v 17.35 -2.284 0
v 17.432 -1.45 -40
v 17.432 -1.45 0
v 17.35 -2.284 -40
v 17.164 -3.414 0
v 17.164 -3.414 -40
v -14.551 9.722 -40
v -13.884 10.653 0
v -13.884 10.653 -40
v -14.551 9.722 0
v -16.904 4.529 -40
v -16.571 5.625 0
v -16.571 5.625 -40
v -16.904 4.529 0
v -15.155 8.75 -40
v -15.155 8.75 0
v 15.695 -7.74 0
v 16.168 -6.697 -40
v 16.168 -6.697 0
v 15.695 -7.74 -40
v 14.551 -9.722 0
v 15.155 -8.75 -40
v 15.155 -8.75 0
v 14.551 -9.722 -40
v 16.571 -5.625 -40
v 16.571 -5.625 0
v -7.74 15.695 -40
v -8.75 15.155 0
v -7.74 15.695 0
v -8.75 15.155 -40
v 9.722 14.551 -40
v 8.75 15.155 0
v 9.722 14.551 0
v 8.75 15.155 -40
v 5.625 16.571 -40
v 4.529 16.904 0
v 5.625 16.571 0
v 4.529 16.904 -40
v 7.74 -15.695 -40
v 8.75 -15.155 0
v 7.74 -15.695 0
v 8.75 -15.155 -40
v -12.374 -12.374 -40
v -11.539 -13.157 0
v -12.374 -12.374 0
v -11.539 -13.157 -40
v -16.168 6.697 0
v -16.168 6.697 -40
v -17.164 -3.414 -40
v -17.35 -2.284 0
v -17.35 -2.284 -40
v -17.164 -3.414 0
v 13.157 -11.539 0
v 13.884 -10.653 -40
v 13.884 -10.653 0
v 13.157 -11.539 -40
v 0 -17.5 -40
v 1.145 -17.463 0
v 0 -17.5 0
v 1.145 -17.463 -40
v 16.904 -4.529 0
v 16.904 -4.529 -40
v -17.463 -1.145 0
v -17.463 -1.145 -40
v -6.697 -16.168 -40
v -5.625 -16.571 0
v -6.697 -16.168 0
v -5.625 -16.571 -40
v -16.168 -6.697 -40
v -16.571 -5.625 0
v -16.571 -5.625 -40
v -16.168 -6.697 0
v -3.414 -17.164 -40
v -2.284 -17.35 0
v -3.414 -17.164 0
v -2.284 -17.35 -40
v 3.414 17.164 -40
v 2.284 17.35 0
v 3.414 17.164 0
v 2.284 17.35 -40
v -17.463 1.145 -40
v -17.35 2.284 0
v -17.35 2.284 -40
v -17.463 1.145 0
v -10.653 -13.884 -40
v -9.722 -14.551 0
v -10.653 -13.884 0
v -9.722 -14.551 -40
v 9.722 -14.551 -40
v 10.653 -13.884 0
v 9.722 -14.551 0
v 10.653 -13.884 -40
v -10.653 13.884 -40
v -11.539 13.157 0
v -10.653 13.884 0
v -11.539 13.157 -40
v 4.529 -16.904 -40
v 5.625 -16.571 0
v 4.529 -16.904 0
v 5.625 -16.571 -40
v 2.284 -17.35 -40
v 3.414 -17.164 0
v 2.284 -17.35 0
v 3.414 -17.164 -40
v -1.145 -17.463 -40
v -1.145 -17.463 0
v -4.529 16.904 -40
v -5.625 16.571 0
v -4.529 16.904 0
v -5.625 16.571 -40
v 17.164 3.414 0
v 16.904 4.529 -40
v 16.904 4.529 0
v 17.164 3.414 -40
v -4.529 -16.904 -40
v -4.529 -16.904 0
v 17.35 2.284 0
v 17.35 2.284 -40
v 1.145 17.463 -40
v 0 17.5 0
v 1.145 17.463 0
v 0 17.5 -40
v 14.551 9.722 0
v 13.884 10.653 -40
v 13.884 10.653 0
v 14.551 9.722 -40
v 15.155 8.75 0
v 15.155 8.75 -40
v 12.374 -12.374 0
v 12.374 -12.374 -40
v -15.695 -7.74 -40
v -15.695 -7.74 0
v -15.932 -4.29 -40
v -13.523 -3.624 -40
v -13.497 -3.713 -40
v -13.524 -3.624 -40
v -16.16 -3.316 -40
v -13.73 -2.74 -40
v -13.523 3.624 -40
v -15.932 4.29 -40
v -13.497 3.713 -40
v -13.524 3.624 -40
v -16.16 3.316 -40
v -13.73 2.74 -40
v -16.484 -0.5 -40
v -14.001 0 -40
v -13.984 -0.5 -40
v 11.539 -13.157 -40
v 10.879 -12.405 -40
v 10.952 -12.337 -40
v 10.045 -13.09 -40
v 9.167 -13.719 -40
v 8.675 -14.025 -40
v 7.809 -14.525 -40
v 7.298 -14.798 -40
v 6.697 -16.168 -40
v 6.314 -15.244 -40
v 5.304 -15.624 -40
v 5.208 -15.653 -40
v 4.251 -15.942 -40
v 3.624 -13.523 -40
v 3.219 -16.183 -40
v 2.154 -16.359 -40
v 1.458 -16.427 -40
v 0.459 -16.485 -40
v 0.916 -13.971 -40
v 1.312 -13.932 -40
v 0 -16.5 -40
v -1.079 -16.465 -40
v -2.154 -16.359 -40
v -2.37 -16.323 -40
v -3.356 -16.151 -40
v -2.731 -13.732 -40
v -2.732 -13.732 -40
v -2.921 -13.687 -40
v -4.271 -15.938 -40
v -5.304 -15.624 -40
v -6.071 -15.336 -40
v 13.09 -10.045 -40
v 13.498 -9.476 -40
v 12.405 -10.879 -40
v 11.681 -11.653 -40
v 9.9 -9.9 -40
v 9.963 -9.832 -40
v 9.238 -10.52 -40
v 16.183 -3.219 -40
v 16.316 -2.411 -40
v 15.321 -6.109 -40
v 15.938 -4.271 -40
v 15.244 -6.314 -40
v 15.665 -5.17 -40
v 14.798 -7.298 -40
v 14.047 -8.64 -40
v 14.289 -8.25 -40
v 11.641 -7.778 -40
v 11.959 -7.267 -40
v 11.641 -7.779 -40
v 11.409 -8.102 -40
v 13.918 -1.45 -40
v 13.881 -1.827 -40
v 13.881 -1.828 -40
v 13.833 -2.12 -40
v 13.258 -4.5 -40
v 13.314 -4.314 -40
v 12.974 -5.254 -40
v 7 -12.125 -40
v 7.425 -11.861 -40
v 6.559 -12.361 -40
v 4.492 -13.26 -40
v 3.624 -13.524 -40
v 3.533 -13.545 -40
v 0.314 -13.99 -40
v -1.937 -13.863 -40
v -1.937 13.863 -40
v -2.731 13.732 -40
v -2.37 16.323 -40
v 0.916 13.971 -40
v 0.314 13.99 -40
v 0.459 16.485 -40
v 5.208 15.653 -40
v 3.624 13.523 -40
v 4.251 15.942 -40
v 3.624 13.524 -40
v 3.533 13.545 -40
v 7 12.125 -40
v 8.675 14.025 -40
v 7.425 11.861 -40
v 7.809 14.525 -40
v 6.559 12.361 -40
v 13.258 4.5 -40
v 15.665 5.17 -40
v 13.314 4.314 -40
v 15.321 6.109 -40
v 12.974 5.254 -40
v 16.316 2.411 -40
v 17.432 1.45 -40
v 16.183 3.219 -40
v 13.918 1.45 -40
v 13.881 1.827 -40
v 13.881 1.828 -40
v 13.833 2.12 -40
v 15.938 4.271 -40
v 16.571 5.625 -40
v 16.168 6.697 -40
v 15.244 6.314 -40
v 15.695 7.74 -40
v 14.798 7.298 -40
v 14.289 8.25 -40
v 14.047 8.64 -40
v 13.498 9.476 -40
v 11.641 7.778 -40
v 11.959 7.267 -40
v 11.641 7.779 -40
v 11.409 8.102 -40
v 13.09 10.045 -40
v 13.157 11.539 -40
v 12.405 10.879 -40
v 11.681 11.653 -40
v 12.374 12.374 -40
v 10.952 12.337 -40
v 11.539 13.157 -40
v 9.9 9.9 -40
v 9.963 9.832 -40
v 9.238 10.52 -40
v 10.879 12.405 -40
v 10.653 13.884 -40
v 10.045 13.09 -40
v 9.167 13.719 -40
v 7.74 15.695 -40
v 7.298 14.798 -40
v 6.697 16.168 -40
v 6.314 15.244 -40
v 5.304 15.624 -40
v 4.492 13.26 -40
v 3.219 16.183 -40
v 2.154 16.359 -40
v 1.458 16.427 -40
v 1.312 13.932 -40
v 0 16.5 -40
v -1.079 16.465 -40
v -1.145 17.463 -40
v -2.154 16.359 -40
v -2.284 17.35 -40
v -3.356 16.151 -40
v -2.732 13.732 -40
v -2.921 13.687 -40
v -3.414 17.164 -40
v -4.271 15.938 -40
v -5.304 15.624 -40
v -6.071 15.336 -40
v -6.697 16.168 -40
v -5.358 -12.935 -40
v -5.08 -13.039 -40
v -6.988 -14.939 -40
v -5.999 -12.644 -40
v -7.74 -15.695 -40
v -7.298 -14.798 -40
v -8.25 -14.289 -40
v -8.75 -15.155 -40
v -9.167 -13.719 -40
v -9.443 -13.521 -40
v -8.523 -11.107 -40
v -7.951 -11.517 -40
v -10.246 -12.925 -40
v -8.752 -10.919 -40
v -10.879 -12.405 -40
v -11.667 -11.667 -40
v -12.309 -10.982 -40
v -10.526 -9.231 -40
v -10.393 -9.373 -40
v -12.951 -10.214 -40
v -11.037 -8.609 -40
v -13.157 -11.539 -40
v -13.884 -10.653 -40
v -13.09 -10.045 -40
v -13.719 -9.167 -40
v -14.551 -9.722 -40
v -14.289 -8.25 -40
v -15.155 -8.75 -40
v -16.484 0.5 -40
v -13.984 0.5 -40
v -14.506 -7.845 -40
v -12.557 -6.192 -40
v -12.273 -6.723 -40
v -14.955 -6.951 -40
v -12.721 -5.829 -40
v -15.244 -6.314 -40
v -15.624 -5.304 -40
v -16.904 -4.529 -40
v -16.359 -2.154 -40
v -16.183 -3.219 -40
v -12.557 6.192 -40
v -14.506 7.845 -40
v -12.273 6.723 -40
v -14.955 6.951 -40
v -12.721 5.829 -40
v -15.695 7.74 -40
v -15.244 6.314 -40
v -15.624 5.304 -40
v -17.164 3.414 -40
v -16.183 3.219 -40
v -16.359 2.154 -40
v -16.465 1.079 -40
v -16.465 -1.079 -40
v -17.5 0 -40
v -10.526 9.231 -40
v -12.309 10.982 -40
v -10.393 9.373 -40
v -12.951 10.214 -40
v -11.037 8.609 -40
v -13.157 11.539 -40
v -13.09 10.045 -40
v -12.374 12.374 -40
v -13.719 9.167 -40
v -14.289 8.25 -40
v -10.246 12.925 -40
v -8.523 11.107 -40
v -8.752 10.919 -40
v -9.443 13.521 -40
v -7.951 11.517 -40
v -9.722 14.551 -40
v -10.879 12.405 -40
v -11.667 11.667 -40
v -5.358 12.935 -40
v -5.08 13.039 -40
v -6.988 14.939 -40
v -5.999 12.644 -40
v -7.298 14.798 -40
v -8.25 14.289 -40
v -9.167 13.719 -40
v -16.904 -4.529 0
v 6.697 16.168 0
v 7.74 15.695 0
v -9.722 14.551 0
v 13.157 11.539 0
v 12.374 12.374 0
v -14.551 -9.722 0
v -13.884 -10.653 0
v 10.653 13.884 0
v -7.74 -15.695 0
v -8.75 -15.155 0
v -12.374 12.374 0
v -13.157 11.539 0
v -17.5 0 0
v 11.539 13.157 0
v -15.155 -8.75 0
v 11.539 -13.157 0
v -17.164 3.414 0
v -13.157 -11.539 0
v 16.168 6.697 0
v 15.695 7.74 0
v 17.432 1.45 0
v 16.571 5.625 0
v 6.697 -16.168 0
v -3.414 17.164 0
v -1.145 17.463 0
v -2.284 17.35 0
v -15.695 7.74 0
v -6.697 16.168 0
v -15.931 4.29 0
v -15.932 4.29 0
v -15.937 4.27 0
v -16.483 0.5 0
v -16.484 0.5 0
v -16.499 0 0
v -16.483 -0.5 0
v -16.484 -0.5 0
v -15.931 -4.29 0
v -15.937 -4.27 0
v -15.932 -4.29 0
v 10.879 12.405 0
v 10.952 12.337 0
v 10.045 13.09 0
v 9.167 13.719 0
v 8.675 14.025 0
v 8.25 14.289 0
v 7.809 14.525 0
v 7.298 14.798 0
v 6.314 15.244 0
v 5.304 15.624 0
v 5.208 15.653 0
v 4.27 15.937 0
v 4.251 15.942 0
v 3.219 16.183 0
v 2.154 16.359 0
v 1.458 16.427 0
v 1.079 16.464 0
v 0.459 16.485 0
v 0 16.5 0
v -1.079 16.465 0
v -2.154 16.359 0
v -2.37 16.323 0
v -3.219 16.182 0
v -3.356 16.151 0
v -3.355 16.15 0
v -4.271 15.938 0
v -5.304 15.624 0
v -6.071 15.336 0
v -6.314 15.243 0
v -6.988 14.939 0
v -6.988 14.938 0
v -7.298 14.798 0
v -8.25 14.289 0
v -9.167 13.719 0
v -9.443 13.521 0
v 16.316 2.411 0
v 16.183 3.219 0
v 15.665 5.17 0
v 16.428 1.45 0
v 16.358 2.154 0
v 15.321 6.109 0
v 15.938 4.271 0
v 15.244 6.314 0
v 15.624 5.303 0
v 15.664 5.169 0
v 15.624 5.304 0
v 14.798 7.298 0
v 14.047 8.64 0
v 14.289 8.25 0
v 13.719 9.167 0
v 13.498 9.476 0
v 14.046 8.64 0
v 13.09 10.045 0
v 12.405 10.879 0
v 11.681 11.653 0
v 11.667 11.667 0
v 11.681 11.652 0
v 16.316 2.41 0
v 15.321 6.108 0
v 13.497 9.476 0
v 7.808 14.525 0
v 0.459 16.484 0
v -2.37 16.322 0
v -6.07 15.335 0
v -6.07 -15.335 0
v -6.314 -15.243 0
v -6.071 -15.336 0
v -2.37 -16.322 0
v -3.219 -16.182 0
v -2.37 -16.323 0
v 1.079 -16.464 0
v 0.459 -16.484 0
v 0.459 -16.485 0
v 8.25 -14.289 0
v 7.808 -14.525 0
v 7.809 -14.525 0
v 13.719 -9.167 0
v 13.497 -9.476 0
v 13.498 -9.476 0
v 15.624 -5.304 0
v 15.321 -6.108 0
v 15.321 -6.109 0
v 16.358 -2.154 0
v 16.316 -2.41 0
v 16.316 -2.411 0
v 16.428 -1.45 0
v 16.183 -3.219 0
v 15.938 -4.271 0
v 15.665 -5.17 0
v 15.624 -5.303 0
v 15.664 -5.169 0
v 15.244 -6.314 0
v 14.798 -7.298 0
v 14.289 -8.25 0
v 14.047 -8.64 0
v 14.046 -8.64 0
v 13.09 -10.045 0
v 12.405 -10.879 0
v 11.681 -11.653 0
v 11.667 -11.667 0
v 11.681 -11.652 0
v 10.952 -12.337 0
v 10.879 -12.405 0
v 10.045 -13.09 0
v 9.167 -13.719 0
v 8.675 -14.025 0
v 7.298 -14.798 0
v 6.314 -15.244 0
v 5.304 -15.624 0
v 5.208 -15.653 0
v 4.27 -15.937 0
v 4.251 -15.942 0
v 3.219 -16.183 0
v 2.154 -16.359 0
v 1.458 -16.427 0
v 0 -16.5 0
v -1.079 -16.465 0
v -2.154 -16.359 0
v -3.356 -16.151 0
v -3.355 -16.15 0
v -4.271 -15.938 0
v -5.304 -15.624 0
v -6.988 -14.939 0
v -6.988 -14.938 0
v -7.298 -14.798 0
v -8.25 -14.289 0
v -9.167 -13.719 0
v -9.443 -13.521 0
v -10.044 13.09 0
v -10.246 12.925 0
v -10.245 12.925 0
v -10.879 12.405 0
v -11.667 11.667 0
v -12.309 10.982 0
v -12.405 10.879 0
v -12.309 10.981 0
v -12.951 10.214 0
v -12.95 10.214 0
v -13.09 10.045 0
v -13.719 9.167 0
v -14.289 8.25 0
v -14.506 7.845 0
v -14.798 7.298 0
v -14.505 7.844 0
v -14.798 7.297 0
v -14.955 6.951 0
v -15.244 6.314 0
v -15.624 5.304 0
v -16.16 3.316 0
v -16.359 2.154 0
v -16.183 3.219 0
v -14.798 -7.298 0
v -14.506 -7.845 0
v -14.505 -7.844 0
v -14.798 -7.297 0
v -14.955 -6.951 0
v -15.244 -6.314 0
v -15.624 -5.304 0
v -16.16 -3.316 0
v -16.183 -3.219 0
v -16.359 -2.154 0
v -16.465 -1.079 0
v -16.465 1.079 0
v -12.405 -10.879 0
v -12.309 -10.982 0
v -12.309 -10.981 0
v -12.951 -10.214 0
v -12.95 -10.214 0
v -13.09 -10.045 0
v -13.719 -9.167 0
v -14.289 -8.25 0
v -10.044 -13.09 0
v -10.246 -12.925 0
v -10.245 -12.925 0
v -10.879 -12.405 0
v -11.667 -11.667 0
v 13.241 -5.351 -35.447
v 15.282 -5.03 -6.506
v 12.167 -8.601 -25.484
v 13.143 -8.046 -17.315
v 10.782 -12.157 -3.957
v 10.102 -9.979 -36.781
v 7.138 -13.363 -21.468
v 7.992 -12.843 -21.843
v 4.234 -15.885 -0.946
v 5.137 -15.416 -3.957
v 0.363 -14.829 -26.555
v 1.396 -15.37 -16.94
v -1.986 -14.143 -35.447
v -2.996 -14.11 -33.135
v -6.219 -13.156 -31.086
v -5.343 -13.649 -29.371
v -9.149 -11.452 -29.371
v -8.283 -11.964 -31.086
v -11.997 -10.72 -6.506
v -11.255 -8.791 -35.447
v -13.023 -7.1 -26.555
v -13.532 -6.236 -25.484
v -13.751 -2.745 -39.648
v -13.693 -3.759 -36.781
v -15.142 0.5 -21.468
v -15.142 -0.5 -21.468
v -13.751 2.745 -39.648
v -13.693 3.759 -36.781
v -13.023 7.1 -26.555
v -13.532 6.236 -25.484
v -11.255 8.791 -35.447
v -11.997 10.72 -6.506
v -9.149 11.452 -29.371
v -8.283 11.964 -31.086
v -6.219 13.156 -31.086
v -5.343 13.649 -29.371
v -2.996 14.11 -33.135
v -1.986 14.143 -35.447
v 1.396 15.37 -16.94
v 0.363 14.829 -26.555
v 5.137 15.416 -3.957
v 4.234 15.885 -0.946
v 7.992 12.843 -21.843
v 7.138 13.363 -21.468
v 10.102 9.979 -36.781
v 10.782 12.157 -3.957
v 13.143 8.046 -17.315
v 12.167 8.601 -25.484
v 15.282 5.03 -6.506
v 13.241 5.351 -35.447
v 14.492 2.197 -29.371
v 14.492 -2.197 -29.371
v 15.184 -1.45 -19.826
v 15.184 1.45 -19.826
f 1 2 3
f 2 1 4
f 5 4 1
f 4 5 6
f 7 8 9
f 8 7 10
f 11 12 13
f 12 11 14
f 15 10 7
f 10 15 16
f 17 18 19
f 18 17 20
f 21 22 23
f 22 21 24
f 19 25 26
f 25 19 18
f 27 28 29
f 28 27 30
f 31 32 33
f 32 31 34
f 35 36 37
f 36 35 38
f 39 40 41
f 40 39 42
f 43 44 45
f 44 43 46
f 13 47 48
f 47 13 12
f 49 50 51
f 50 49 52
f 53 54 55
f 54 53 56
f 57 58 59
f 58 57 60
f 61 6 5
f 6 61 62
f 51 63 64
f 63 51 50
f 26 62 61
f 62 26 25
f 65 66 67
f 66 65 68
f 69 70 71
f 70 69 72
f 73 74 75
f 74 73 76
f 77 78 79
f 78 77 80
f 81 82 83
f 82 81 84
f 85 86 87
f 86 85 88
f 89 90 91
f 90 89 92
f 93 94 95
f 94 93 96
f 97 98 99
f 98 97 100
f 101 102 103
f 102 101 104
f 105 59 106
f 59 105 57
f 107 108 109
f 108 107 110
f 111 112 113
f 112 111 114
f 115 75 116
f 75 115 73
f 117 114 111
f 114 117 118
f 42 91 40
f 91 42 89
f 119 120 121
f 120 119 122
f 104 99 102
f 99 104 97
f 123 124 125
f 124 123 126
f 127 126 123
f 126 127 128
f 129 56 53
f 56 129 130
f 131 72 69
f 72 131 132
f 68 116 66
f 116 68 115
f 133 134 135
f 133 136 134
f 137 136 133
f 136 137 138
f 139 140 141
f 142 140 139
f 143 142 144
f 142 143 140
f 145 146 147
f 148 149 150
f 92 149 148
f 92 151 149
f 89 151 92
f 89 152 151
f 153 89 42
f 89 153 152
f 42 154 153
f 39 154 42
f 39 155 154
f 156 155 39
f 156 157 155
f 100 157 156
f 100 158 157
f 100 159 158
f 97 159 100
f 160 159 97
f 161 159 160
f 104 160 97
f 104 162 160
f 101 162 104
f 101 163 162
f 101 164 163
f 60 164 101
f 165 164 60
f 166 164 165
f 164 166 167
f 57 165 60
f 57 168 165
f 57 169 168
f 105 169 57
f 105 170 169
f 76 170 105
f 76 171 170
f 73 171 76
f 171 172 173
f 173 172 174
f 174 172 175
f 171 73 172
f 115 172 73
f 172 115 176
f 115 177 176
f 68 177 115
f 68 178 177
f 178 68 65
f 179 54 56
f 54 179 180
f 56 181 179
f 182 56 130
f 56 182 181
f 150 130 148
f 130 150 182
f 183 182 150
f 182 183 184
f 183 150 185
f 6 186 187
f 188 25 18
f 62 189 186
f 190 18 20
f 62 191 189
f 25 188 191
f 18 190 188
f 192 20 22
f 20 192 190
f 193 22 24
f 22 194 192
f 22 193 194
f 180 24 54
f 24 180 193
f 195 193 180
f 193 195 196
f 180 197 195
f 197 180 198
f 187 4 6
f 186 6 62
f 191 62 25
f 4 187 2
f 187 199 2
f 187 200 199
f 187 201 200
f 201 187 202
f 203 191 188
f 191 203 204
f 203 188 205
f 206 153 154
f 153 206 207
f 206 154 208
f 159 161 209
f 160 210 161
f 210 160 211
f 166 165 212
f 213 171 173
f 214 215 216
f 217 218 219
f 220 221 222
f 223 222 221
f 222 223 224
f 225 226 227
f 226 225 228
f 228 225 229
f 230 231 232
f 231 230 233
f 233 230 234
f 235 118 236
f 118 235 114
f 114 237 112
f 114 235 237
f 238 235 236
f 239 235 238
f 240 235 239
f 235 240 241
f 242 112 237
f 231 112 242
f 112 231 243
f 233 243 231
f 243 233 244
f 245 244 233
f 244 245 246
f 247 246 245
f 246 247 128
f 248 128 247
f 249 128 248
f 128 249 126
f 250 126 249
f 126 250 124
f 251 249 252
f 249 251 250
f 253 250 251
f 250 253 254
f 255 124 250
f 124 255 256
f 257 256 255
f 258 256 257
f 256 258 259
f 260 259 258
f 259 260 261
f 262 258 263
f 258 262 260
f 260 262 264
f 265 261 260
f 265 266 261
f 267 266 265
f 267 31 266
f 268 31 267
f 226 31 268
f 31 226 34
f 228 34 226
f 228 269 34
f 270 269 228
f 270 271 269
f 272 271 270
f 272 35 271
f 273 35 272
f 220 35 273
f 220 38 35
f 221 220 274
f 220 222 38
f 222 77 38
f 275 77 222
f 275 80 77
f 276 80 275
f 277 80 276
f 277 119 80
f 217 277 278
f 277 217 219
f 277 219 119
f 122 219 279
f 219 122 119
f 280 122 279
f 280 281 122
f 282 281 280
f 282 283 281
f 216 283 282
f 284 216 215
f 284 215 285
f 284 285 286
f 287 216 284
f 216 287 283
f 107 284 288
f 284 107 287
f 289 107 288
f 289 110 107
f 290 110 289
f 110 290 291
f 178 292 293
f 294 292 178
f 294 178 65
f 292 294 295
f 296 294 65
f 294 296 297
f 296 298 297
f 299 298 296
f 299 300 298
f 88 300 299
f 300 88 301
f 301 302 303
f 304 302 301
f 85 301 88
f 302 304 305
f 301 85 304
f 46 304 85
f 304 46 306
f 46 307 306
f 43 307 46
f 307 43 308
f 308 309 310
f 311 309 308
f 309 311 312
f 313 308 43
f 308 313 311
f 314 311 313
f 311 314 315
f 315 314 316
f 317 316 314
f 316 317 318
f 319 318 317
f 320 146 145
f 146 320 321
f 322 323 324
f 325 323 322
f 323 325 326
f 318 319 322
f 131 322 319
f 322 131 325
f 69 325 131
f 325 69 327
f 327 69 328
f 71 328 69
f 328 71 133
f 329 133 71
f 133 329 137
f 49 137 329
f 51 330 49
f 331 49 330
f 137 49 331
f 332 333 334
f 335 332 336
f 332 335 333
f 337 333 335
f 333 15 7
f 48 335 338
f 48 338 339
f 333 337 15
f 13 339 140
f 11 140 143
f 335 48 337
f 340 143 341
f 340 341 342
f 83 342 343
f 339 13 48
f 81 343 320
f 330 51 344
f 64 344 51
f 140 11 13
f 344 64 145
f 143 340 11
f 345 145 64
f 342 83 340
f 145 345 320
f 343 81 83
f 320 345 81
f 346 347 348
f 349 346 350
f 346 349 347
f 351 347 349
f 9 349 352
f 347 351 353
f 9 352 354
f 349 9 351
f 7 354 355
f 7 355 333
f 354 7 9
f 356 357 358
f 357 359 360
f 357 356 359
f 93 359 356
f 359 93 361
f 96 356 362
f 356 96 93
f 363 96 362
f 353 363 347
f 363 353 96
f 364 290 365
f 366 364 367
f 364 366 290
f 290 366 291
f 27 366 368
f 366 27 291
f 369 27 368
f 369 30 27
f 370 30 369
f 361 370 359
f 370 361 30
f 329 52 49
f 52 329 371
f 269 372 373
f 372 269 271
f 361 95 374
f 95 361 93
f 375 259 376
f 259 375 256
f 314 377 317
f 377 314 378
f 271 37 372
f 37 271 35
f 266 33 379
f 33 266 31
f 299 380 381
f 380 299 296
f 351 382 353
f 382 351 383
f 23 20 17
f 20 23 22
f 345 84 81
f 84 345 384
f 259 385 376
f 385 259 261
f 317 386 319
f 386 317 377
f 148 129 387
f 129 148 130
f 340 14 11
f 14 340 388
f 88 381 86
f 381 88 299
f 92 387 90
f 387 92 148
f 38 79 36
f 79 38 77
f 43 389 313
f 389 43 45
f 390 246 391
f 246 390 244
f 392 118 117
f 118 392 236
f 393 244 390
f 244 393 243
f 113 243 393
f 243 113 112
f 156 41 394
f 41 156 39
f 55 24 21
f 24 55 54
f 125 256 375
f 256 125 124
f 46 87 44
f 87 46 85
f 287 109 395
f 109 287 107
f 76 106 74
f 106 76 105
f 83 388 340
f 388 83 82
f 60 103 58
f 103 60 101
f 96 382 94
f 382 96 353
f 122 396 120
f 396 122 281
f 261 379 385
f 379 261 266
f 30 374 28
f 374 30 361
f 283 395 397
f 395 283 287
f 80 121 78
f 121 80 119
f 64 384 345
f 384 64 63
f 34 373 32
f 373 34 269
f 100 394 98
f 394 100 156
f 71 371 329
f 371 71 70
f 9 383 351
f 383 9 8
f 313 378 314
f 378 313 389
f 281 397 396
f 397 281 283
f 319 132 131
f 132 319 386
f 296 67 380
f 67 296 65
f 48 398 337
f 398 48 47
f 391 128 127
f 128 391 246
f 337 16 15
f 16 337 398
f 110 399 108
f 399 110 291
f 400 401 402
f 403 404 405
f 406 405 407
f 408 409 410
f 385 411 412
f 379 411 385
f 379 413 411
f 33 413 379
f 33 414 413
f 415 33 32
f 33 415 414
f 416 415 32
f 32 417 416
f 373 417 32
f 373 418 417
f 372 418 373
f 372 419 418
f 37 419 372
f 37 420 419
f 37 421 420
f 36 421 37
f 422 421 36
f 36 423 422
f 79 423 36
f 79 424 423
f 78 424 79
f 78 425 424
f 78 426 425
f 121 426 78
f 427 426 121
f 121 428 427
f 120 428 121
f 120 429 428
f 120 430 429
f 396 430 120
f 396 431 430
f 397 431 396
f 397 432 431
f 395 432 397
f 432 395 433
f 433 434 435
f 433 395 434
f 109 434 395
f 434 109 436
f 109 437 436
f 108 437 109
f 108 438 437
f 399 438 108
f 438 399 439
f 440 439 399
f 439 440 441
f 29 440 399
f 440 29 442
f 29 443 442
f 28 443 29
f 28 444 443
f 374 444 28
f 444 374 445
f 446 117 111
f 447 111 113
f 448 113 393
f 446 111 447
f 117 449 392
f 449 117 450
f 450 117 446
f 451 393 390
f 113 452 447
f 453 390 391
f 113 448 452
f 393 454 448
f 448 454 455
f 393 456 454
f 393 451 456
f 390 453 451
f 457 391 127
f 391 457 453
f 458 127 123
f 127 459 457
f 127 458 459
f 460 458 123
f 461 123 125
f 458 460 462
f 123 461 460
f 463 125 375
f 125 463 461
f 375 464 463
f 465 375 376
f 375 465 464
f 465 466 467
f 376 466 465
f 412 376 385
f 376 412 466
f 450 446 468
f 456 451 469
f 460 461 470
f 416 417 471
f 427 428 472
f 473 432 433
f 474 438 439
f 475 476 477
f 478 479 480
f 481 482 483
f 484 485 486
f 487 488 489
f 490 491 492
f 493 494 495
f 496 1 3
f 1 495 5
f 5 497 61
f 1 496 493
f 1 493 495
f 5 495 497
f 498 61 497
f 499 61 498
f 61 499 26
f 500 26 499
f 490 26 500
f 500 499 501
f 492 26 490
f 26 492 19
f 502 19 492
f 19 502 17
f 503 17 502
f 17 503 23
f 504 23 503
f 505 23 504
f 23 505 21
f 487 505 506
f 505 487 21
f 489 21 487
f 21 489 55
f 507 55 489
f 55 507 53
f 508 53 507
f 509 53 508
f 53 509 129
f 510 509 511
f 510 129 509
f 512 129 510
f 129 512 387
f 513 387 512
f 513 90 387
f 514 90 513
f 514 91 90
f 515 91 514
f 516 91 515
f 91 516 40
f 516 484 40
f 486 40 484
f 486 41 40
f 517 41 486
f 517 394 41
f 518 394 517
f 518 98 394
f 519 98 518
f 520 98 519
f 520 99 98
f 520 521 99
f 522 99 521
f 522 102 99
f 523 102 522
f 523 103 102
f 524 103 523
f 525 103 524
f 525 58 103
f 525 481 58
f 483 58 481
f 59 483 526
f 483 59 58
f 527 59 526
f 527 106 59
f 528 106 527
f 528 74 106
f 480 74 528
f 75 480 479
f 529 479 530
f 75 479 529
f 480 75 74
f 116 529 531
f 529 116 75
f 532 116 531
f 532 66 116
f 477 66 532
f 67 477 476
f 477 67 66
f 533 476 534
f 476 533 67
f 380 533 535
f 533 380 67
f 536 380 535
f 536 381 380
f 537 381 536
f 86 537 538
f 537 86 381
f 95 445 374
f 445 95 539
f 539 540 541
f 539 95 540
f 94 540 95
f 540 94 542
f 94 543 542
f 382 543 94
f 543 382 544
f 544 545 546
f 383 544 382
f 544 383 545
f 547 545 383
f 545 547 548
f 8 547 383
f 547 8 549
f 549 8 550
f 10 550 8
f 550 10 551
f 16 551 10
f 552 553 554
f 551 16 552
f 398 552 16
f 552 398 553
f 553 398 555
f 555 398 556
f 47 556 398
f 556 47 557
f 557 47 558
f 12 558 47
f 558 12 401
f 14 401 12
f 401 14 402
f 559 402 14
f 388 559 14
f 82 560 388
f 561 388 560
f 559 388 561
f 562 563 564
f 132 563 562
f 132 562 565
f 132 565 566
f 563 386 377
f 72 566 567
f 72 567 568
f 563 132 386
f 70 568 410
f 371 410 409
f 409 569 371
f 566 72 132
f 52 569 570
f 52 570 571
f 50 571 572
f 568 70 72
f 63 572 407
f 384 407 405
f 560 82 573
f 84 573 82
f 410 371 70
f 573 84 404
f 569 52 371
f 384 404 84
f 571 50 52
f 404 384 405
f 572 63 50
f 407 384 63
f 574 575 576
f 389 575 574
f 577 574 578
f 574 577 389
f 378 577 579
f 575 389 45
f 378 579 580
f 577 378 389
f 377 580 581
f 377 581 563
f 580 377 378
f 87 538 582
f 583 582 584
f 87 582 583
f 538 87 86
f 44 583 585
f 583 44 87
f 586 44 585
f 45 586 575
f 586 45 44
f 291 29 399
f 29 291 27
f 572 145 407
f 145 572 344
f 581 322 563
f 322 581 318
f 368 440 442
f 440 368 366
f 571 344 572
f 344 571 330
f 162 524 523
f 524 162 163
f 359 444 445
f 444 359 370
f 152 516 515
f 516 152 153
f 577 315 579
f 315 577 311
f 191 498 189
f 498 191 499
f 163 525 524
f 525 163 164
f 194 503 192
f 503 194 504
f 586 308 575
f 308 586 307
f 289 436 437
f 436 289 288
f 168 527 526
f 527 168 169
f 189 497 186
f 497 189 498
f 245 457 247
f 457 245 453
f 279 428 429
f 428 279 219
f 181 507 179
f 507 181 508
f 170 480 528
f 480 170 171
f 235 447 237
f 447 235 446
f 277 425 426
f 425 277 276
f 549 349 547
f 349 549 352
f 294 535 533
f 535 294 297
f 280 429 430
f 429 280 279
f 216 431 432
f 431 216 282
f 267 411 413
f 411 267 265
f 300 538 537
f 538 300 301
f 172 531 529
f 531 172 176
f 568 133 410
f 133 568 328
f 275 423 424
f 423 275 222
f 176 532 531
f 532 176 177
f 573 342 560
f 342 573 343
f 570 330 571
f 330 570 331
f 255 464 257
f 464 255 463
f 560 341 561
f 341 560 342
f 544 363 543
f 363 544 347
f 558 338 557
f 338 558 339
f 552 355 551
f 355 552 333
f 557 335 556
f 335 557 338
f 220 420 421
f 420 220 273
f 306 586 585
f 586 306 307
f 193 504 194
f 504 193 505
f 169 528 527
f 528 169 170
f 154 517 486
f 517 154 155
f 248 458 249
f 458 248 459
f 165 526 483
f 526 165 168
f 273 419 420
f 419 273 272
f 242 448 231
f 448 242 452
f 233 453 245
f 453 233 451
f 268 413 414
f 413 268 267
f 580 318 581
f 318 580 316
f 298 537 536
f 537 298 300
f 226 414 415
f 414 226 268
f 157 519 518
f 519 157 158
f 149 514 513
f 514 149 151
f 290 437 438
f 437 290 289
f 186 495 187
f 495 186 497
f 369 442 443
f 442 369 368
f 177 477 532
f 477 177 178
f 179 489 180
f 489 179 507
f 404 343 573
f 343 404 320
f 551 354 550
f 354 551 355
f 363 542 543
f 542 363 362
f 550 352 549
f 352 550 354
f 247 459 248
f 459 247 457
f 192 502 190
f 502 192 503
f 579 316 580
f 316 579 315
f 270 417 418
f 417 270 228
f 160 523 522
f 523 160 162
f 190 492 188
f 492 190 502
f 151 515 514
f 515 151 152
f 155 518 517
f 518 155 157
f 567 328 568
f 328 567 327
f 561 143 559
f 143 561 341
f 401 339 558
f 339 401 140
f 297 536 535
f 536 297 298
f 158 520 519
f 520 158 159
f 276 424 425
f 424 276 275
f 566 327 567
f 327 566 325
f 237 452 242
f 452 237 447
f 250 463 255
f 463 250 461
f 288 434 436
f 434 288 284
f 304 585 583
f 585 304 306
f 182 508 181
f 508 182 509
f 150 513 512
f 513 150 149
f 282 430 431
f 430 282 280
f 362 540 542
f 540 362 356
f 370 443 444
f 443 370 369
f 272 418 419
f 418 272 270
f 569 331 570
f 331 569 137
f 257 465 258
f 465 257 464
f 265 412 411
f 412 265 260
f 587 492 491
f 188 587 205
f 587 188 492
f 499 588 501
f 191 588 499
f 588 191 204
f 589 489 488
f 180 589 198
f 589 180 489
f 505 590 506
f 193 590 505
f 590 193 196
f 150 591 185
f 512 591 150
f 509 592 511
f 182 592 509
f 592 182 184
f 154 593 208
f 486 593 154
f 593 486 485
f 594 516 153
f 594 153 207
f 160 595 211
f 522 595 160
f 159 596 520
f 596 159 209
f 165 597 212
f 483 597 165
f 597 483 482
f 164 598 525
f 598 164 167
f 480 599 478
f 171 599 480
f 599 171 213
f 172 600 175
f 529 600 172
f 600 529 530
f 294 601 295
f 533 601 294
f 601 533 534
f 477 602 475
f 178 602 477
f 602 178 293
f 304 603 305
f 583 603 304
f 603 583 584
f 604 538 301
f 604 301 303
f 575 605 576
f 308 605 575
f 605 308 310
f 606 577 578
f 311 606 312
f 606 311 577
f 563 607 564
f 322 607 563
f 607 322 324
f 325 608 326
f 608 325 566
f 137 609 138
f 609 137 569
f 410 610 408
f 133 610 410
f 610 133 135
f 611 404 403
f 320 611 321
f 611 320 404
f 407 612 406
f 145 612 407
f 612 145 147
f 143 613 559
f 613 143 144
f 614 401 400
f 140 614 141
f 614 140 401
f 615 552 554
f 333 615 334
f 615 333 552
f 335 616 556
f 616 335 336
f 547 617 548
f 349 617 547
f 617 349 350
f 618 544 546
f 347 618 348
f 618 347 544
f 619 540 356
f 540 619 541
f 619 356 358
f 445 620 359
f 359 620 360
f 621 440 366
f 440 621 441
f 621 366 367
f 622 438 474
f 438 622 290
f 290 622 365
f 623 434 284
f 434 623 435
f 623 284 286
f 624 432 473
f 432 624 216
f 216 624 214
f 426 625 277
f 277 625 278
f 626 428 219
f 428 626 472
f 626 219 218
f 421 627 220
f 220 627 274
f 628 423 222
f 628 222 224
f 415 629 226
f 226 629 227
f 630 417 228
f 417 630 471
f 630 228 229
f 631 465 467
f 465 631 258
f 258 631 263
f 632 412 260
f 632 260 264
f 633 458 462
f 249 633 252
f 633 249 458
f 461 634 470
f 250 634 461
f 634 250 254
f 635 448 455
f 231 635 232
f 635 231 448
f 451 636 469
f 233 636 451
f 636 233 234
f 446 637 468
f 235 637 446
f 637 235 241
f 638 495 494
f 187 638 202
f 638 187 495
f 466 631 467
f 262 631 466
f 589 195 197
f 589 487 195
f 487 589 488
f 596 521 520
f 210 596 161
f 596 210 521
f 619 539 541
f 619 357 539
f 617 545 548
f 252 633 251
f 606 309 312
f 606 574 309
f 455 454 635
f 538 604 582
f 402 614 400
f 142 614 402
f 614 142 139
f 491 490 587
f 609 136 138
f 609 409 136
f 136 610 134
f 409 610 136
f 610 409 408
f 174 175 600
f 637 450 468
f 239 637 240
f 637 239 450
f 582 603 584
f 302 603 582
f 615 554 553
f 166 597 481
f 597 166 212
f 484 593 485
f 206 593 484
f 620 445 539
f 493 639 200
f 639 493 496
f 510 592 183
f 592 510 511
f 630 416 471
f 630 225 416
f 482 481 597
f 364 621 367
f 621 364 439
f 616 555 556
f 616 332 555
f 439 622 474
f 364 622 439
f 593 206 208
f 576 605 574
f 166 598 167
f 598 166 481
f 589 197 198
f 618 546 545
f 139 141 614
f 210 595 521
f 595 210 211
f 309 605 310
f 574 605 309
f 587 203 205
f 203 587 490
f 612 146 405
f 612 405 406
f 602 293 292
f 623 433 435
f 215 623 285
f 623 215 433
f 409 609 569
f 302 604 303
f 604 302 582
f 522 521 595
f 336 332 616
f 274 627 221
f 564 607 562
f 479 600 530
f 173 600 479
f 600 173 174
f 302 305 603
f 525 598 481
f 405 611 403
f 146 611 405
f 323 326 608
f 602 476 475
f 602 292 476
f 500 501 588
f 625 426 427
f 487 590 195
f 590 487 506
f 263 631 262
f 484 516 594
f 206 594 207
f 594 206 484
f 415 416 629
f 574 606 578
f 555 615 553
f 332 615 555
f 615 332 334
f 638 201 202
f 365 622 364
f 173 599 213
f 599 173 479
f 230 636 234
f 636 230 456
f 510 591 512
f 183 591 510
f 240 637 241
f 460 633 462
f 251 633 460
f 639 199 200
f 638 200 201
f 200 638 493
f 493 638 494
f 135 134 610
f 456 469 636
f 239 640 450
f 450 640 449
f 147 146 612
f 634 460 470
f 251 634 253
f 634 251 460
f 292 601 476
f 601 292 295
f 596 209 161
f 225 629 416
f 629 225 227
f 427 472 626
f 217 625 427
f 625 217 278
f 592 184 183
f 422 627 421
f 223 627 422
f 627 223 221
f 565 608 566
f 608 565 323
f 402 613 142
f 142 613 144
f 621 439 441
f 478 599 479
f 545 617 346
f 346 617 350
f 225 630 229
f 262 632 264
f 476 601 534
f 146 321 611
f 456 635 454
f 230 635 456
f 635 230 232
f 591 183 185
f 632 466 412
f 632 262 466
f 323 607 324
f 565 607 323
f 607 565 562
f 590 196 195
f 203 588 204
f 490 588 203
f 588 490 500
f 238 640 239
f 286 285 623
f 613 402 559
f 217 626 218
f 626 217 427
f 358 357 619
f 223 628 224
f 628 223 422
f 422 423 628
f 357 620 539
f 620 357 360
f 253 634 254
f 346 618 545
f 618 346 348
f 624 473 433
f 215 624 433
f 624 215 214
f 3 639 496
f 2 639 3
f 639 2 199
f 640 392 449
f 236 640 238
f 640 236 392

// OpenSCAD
// Spreizer - conical spreader
// 
// Background:
//   - two conical shapes, one being slotted to press against a cylinder
//   - Waschbeckenverschluss
//     hiermit kann im Abfluss der Ueberlauf verschlossen werden, um
//     die unzugaenglichen Hohlraeume im Waschbecken mit 
//     Reinigungsmitteln zu fluten.
//
// Author: Andreas Merz, 2021-05-01
//   GPLv3 or later, see http://www.gnu.org/licenses 


w  =  1.0;    // wall thickness
dr =  5.0;    // change in radius of cones
c  =  0.15;   // clearance
do = 35.0;    // outer diameter of outer cylinder
h1 = 40.0;    // cylinder height


// conical boundary
module cone_b( dd=do-2*w, hh=h1 ) {
  cylinder( d1=dd, d2=dd-dr, h=hh, $fn=96);
}

module cone_i() {
  difference () {
    translate([0,0,0])   cone_b(dd=do-2*w, hh=h1);
    union() {
      translate([0,0,w]) cone_b(dd=do-4*w, hh=h1+0.1);
      translate([0,0,-0.1]) cylinder( d=do-4*w-10, h=w+0.2, $fn=96);
    }
  }  
}


// one fin
module fin(ri=do/2-dr, ro=do/2, hh=h1, ww=w) {
  translate([ri,-ww/2, 0]) cube([ro-ri-ww/2, ww, hh]);
}

// many fins in a circle
module fins() {
  n=27;
  for(i=[1:n]) {
    phi=(360/n)*(i+0.5);
    rotate([0, 0, phi]) fin();
  }
}


// cylinder with inner fins
module fincyl_o() {
    union() {
      difference () {
	translate([0,0,   0]) cylinder( d=do,     h=h1,     $fn=96);
	translate([0,0,-0.1]) cylinder( d=do-2*w, h=h1+0.2, $fn=96);
      } 
      fins();
      //cone_b(dd=do-2*w, hh=h1);
    }
}

// final part: cut a cone and a gap
module cone_o() {
    rotate([180, 0, 0])
    difference() {
      fincyl_o();
      translate([0,0, -0.01])
	union() {
          cone_b(hh=h1+0.02);
	  fin(ro=do/2+dr, hh=h1+0.02, ww=2.9*w);
	}
    }
}



//------------- Instances --------------------
//fins();

//cone_i();
cone_o();
